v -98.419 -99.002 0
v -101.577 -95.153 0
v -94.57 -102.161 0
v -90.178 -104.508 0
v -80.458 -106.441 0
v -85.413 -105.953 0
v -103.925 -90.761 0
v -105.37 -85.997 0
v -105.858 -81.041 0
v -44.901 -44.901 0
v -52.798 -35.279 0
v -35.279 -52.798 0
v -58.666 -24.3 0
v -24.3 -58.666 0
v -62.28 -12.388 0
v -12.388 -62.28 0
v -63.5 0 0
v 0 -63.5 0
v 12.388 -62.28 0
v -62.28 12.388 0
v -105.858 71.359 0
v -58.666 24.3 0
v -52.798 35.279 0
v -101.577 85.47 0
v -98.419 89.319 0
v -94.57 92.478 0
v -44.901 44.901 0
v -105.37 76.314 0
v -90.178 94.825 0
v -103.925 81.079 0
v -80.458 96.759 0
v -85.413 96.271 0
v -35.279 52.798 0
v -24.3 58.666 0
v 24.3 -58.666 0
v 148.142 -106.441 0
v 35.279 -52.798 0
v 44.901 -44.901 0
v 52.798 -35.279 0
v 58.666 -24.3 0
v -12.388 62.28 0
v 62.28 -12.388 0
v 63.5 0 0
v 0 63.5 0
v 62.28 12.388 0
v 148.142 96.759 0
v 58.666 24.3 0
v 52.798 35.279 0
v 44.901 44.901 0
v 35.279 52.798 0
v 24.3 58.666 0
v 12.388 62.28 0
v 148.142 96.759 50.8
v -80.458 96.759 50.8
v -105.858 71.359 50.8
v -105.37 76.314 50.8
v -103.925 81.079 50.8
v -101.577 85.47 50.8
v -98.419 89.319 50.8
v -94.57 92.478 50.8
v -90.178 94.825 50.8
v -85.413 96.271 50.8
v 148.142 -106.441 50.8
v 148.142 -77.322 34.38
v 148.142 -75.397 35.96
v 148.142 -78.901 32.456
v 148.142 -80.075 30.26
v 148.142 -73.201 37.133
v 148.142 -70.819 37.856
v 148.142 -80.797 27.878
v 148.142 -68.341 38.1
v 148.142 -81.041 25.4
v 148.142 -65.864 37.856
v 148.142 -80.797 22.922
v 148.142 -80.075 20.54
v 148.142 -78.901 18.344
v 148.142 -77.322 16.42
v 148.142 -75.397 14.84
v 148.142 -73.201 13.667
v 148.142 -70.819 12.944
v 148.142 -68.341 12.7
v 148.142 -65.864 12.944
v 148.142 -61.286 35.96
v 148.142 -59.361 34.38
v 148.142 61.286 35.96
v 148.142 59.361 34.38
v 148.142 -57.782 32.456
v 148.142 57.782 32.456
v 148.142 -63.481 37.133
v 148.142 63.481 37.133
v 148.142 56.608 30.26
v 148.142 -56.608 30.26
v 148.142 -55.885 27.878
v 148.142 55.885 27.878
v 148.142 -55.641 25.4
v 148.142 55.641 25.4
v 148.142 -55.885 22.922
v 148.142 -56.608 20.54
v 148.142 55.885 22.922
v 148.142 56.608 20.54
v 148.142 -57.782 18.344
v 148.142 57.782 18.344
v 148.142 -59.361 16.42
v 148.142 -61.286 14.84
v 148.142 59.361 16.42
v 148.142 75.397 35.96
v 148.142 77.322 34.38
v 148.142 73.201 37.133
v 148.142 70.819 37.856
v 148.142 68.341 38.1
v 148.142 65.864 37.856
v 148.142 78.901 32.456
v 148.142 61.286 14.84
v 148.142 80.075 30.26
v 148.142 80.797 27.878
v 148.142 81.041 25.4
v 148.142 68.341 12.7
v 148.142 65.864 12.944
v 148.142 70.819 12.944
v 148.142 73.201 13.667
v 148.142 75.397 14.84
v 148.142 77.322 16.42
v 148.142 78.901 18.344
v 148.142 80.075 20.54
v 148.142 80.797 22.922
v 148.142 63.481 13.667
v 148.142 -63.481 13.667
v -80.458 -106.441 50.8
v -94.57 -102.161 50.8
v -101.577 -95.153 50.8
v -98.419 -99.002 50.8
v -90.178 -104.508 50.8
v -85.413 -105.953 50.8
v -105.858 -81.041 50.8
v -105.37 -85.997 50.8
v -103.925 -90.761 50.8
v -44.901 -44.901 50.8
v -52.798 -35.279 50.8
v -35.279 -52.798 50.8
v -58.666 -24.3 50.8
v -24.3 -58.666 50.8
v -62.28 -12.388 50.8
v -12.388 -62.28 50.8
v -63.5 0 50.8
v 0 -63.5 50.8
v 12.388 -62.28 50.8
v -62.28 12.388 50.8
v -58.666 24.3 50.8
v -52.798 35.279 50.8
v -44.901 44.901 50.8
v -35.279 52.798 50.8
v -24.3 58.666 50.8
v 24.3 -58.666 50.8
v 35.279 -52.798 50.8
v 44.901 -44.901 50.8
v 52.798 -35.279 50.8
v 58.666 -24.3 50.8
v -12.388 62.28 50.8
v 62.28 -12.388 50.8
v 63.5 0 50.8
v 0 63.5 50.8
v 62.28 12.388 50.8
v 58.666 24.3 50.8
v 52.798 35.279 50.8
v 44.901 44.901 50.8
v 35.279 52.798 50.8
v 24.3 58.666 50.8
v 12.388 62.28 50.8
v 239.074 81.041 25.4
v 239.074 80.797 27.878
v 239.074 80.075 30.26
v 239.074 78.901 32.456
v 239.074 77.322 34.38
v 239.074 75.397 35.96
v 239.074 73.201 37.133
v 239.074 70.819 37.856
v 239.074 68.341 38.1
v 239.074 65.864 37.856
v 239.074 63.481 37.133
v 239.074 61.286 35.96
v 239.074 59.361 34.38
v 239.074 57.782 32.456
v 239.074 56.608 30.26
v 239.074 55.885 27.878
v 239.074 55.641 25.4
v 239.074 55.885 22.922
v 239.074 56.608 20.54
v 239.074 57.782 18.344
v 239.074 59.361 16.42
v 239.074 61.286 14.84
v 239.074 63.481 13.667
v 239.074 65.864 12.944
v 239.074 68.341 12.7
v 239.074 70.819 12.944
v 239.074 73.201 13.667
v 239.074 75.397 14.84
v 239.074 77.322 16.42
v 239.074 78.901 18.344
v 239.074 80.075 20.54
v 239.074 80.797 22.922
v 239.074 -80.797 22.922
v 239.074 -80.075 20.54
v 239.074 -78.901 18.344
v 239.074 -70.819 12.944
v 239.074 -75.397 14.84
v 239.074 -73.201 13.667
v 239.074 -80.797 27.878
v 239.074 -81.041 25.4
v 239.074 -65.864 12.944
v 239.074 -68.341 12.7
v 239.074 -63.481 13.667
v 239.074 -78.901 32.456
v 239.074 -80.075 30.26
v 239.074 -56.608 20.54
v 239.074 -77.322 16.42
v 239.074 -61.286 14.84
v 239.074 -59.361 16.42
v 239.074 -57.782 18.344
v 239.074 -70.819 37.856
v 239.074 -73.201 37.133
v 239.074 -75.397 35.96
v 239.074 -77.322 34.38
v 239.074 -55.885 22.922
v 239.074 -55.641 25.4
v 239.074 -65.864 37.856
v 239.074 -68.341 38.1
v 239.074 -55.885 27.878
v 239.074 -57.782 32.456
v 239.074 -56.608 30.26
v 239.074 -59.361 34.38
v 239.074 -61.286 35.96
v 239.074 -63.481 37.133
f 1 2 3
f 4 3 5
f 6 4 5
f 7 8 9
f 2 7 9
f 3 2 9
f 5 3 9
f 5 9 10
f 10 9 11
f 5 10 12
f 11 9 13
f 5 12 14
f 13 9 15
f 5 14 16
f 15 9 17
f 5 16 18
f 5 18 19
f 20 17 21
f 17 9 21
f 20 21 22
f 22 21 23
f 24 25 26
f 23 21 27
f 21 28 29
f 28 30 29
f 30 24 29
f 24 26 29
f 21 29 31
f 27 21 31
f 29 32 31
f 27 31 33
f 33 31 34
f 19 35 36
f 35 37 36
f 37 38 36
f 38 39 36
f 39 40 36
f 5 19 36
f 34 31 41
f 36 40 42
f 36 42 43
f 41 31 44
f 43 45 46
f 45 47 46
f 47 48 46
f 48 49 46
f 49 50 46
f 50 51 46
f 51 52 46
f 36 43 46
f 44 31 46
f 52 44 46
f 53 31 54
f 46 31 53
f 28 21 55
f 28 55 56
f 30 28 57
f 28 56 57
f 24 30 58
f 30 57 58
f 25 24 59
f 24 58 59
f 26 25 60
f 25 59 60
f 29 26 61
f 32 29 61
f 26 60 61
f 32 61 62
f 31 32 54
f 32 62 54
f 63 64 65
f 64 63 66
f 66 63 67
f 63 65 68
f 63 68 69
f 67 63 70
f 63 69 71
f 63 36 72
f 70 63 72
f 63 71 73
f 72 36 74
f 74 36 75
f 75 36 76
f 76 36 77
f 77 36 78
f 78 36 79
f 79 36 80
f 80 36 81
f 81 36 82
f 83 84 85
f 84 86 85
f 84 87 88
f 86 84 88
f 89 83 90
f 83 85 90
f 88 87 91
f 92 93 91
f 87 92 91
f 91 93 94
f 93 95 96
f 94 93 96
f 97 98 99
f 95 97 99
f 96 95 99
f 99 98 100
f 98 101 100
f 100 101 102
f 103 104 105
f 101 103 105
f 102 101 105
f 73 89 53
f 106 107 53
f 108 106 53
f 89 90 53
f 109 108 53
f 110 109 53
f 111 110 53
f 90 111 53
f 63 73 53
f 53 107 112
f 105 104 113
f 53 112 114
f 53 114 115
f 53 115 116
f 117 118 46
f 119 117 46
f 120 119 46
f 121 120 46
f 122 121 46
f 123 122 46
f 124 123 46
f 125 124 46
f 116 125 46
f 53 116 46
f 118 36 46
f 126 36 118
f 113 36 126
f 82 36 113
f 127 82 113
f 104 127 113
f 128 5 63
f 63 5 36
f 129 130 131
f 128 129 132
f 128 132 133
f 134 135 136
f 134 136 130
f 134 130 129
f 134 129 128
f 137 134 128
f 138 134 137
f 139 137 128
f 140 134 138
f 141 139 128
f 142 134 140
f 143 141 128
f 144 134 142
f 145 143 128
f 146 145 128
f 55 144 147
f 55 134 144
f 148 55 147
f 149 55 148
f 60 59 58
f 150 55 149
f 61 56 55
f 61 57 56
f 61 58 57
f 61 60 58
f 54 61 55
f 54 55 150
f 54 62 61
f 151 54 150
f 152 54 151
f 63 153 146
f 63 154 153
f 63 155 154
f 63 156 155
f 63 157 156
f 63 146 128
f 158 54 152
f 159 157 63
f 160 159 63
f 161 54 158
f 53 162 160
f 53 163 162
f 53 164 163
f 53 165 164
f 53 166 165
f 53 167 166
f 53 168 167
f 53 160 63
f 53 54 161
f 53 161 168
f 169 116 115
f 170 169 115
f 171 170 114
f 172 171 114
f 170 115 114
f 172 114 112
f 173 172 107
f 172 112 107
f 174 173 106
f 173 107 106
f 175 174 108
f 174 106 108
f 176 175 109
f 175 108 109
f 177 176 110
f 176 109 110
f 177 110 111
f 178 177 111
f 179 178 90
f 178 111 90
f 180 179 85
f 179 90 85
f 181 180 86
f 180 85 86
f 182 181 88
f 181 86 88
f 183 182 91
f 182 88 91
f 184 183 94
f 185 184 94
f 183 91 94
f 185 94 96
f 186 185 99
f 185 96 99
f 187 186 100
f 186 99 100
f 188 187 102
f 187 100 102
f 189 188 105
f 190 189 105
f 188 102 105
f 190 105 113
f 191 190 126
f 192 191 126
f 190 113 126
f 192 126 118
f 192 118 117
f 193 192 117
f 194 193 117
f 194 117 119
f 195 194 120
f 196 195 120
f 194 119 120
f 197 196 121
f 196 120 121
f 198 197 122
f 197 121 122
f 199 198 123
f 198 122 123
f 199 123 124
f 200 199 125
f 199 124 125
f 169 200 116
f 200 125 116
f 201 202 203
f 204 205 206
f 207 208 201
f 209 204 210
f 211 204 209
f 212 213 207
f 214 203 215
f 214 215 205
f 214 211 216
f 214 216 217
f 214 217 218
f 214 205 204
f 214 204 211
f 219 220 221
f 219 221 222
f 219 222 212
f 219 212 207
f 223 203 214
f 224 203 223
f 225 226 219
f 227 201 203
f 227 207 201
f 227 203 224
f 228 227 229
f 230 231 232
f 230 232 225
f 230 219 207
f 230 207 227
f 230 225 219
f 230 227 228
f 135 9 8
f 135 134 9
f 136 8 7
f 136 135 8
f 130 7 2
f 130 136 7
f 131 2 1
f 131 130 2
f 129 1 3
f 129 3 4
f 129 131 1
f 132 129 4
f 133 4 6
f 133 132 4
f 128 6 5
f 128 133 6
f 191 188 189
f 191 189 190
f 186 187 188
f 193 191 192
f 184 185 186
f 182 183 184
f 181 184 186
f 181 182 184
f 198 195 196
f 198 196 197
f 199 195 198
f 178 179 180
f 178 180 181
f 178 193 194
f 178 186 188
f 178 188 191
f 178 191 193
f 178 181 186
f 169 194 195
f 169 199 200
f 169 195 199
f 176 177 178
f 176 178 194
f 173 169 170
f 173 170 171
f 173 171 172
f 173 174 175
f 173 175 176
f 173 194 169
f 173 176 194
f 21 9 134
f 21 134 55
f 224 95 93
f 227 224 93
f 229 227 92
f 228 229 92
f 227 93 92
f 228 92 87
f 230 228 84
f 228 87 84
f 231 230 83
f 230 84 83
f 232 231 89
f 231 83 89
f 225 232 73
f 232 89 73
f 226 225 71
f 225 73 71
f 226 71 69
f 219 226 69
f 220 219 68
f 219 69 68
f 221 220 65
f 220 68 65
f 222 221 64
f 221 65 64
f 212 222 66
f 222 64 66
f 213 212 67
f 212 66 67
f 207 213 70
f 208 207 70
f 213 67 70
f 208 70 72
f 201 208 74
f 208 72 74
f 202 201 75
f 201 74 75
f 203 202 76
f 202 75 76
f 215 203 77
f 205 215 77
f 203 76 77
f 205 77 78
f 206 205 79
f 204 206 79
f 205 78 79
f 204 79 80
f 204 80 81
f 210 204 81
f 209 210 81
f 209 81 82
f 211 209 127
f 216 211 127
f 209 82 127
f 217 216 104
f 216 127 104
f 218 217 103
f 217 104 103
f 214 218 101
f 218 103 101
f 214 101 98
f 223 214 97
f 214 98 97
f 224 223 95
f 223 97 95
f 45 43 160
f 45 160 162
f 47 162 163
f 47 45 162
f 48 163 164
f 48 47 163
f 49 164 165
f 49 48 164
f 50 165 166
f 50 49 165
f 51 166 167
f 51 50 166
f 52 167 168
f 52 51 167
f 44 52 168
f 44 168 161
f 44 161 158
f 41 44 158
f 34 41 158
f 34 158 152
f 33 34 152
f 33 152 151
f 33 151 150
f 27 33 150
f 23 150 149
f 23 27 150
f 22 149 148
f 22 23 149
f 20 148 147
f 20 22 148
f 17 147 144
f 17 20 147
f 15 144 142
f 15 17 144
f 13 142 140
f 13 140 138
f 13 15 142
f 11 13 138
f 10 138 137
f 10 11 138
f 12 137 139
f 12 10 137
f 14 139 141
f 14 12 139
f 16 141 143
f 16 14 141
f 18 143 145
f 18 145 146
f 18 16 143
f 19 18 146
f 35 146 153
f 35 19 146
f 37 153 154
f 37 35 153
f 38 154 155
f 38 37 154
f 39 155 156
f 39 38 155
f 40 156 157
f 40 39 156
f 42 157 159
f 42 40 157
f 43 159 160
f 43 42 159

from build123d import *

# Parameters (mm, degrees)
F0_W     = 254
F0_H     = 203.2
F0_R     = 63.5
F1_DEPTH = 50.8
F2_R     = 25.4
F3_R     = 12.7
F4_DEPTH = 90.932


with BuildPart() as f1:
    # F0 (on Top) → F1 (new body)
    with BuildSketch(Plane.XY):
        with Locations((21.141905, -4.841334)):
            Rectangle(F0_W, F0_H)
        Circle(F0_R, mode=Mode.SUBTRACT)
    extrude(amount=F1_DEPTH)

    # F2
    f2_edges = [f1.edges().sort_by_distance(p)[0] for p in [
        (-105.858095, 96.758666, 25.4),
        (-105.858095, -106.441334, 25.4),
    ]]
    fillet(f2_edges, radius=F2_R)

    # F3 (on face) → F4 (join)
    with BuildSketch(Plane.YZ.offset(148.141905)):
        with Locations((-68.341334, 25.4)):
            Circle(F3_R)
        with Locations((68.341334, 25.4)):
            Circle(F3_R)
    extrude(amount=F4_DEPTH)


solid = f1.part
